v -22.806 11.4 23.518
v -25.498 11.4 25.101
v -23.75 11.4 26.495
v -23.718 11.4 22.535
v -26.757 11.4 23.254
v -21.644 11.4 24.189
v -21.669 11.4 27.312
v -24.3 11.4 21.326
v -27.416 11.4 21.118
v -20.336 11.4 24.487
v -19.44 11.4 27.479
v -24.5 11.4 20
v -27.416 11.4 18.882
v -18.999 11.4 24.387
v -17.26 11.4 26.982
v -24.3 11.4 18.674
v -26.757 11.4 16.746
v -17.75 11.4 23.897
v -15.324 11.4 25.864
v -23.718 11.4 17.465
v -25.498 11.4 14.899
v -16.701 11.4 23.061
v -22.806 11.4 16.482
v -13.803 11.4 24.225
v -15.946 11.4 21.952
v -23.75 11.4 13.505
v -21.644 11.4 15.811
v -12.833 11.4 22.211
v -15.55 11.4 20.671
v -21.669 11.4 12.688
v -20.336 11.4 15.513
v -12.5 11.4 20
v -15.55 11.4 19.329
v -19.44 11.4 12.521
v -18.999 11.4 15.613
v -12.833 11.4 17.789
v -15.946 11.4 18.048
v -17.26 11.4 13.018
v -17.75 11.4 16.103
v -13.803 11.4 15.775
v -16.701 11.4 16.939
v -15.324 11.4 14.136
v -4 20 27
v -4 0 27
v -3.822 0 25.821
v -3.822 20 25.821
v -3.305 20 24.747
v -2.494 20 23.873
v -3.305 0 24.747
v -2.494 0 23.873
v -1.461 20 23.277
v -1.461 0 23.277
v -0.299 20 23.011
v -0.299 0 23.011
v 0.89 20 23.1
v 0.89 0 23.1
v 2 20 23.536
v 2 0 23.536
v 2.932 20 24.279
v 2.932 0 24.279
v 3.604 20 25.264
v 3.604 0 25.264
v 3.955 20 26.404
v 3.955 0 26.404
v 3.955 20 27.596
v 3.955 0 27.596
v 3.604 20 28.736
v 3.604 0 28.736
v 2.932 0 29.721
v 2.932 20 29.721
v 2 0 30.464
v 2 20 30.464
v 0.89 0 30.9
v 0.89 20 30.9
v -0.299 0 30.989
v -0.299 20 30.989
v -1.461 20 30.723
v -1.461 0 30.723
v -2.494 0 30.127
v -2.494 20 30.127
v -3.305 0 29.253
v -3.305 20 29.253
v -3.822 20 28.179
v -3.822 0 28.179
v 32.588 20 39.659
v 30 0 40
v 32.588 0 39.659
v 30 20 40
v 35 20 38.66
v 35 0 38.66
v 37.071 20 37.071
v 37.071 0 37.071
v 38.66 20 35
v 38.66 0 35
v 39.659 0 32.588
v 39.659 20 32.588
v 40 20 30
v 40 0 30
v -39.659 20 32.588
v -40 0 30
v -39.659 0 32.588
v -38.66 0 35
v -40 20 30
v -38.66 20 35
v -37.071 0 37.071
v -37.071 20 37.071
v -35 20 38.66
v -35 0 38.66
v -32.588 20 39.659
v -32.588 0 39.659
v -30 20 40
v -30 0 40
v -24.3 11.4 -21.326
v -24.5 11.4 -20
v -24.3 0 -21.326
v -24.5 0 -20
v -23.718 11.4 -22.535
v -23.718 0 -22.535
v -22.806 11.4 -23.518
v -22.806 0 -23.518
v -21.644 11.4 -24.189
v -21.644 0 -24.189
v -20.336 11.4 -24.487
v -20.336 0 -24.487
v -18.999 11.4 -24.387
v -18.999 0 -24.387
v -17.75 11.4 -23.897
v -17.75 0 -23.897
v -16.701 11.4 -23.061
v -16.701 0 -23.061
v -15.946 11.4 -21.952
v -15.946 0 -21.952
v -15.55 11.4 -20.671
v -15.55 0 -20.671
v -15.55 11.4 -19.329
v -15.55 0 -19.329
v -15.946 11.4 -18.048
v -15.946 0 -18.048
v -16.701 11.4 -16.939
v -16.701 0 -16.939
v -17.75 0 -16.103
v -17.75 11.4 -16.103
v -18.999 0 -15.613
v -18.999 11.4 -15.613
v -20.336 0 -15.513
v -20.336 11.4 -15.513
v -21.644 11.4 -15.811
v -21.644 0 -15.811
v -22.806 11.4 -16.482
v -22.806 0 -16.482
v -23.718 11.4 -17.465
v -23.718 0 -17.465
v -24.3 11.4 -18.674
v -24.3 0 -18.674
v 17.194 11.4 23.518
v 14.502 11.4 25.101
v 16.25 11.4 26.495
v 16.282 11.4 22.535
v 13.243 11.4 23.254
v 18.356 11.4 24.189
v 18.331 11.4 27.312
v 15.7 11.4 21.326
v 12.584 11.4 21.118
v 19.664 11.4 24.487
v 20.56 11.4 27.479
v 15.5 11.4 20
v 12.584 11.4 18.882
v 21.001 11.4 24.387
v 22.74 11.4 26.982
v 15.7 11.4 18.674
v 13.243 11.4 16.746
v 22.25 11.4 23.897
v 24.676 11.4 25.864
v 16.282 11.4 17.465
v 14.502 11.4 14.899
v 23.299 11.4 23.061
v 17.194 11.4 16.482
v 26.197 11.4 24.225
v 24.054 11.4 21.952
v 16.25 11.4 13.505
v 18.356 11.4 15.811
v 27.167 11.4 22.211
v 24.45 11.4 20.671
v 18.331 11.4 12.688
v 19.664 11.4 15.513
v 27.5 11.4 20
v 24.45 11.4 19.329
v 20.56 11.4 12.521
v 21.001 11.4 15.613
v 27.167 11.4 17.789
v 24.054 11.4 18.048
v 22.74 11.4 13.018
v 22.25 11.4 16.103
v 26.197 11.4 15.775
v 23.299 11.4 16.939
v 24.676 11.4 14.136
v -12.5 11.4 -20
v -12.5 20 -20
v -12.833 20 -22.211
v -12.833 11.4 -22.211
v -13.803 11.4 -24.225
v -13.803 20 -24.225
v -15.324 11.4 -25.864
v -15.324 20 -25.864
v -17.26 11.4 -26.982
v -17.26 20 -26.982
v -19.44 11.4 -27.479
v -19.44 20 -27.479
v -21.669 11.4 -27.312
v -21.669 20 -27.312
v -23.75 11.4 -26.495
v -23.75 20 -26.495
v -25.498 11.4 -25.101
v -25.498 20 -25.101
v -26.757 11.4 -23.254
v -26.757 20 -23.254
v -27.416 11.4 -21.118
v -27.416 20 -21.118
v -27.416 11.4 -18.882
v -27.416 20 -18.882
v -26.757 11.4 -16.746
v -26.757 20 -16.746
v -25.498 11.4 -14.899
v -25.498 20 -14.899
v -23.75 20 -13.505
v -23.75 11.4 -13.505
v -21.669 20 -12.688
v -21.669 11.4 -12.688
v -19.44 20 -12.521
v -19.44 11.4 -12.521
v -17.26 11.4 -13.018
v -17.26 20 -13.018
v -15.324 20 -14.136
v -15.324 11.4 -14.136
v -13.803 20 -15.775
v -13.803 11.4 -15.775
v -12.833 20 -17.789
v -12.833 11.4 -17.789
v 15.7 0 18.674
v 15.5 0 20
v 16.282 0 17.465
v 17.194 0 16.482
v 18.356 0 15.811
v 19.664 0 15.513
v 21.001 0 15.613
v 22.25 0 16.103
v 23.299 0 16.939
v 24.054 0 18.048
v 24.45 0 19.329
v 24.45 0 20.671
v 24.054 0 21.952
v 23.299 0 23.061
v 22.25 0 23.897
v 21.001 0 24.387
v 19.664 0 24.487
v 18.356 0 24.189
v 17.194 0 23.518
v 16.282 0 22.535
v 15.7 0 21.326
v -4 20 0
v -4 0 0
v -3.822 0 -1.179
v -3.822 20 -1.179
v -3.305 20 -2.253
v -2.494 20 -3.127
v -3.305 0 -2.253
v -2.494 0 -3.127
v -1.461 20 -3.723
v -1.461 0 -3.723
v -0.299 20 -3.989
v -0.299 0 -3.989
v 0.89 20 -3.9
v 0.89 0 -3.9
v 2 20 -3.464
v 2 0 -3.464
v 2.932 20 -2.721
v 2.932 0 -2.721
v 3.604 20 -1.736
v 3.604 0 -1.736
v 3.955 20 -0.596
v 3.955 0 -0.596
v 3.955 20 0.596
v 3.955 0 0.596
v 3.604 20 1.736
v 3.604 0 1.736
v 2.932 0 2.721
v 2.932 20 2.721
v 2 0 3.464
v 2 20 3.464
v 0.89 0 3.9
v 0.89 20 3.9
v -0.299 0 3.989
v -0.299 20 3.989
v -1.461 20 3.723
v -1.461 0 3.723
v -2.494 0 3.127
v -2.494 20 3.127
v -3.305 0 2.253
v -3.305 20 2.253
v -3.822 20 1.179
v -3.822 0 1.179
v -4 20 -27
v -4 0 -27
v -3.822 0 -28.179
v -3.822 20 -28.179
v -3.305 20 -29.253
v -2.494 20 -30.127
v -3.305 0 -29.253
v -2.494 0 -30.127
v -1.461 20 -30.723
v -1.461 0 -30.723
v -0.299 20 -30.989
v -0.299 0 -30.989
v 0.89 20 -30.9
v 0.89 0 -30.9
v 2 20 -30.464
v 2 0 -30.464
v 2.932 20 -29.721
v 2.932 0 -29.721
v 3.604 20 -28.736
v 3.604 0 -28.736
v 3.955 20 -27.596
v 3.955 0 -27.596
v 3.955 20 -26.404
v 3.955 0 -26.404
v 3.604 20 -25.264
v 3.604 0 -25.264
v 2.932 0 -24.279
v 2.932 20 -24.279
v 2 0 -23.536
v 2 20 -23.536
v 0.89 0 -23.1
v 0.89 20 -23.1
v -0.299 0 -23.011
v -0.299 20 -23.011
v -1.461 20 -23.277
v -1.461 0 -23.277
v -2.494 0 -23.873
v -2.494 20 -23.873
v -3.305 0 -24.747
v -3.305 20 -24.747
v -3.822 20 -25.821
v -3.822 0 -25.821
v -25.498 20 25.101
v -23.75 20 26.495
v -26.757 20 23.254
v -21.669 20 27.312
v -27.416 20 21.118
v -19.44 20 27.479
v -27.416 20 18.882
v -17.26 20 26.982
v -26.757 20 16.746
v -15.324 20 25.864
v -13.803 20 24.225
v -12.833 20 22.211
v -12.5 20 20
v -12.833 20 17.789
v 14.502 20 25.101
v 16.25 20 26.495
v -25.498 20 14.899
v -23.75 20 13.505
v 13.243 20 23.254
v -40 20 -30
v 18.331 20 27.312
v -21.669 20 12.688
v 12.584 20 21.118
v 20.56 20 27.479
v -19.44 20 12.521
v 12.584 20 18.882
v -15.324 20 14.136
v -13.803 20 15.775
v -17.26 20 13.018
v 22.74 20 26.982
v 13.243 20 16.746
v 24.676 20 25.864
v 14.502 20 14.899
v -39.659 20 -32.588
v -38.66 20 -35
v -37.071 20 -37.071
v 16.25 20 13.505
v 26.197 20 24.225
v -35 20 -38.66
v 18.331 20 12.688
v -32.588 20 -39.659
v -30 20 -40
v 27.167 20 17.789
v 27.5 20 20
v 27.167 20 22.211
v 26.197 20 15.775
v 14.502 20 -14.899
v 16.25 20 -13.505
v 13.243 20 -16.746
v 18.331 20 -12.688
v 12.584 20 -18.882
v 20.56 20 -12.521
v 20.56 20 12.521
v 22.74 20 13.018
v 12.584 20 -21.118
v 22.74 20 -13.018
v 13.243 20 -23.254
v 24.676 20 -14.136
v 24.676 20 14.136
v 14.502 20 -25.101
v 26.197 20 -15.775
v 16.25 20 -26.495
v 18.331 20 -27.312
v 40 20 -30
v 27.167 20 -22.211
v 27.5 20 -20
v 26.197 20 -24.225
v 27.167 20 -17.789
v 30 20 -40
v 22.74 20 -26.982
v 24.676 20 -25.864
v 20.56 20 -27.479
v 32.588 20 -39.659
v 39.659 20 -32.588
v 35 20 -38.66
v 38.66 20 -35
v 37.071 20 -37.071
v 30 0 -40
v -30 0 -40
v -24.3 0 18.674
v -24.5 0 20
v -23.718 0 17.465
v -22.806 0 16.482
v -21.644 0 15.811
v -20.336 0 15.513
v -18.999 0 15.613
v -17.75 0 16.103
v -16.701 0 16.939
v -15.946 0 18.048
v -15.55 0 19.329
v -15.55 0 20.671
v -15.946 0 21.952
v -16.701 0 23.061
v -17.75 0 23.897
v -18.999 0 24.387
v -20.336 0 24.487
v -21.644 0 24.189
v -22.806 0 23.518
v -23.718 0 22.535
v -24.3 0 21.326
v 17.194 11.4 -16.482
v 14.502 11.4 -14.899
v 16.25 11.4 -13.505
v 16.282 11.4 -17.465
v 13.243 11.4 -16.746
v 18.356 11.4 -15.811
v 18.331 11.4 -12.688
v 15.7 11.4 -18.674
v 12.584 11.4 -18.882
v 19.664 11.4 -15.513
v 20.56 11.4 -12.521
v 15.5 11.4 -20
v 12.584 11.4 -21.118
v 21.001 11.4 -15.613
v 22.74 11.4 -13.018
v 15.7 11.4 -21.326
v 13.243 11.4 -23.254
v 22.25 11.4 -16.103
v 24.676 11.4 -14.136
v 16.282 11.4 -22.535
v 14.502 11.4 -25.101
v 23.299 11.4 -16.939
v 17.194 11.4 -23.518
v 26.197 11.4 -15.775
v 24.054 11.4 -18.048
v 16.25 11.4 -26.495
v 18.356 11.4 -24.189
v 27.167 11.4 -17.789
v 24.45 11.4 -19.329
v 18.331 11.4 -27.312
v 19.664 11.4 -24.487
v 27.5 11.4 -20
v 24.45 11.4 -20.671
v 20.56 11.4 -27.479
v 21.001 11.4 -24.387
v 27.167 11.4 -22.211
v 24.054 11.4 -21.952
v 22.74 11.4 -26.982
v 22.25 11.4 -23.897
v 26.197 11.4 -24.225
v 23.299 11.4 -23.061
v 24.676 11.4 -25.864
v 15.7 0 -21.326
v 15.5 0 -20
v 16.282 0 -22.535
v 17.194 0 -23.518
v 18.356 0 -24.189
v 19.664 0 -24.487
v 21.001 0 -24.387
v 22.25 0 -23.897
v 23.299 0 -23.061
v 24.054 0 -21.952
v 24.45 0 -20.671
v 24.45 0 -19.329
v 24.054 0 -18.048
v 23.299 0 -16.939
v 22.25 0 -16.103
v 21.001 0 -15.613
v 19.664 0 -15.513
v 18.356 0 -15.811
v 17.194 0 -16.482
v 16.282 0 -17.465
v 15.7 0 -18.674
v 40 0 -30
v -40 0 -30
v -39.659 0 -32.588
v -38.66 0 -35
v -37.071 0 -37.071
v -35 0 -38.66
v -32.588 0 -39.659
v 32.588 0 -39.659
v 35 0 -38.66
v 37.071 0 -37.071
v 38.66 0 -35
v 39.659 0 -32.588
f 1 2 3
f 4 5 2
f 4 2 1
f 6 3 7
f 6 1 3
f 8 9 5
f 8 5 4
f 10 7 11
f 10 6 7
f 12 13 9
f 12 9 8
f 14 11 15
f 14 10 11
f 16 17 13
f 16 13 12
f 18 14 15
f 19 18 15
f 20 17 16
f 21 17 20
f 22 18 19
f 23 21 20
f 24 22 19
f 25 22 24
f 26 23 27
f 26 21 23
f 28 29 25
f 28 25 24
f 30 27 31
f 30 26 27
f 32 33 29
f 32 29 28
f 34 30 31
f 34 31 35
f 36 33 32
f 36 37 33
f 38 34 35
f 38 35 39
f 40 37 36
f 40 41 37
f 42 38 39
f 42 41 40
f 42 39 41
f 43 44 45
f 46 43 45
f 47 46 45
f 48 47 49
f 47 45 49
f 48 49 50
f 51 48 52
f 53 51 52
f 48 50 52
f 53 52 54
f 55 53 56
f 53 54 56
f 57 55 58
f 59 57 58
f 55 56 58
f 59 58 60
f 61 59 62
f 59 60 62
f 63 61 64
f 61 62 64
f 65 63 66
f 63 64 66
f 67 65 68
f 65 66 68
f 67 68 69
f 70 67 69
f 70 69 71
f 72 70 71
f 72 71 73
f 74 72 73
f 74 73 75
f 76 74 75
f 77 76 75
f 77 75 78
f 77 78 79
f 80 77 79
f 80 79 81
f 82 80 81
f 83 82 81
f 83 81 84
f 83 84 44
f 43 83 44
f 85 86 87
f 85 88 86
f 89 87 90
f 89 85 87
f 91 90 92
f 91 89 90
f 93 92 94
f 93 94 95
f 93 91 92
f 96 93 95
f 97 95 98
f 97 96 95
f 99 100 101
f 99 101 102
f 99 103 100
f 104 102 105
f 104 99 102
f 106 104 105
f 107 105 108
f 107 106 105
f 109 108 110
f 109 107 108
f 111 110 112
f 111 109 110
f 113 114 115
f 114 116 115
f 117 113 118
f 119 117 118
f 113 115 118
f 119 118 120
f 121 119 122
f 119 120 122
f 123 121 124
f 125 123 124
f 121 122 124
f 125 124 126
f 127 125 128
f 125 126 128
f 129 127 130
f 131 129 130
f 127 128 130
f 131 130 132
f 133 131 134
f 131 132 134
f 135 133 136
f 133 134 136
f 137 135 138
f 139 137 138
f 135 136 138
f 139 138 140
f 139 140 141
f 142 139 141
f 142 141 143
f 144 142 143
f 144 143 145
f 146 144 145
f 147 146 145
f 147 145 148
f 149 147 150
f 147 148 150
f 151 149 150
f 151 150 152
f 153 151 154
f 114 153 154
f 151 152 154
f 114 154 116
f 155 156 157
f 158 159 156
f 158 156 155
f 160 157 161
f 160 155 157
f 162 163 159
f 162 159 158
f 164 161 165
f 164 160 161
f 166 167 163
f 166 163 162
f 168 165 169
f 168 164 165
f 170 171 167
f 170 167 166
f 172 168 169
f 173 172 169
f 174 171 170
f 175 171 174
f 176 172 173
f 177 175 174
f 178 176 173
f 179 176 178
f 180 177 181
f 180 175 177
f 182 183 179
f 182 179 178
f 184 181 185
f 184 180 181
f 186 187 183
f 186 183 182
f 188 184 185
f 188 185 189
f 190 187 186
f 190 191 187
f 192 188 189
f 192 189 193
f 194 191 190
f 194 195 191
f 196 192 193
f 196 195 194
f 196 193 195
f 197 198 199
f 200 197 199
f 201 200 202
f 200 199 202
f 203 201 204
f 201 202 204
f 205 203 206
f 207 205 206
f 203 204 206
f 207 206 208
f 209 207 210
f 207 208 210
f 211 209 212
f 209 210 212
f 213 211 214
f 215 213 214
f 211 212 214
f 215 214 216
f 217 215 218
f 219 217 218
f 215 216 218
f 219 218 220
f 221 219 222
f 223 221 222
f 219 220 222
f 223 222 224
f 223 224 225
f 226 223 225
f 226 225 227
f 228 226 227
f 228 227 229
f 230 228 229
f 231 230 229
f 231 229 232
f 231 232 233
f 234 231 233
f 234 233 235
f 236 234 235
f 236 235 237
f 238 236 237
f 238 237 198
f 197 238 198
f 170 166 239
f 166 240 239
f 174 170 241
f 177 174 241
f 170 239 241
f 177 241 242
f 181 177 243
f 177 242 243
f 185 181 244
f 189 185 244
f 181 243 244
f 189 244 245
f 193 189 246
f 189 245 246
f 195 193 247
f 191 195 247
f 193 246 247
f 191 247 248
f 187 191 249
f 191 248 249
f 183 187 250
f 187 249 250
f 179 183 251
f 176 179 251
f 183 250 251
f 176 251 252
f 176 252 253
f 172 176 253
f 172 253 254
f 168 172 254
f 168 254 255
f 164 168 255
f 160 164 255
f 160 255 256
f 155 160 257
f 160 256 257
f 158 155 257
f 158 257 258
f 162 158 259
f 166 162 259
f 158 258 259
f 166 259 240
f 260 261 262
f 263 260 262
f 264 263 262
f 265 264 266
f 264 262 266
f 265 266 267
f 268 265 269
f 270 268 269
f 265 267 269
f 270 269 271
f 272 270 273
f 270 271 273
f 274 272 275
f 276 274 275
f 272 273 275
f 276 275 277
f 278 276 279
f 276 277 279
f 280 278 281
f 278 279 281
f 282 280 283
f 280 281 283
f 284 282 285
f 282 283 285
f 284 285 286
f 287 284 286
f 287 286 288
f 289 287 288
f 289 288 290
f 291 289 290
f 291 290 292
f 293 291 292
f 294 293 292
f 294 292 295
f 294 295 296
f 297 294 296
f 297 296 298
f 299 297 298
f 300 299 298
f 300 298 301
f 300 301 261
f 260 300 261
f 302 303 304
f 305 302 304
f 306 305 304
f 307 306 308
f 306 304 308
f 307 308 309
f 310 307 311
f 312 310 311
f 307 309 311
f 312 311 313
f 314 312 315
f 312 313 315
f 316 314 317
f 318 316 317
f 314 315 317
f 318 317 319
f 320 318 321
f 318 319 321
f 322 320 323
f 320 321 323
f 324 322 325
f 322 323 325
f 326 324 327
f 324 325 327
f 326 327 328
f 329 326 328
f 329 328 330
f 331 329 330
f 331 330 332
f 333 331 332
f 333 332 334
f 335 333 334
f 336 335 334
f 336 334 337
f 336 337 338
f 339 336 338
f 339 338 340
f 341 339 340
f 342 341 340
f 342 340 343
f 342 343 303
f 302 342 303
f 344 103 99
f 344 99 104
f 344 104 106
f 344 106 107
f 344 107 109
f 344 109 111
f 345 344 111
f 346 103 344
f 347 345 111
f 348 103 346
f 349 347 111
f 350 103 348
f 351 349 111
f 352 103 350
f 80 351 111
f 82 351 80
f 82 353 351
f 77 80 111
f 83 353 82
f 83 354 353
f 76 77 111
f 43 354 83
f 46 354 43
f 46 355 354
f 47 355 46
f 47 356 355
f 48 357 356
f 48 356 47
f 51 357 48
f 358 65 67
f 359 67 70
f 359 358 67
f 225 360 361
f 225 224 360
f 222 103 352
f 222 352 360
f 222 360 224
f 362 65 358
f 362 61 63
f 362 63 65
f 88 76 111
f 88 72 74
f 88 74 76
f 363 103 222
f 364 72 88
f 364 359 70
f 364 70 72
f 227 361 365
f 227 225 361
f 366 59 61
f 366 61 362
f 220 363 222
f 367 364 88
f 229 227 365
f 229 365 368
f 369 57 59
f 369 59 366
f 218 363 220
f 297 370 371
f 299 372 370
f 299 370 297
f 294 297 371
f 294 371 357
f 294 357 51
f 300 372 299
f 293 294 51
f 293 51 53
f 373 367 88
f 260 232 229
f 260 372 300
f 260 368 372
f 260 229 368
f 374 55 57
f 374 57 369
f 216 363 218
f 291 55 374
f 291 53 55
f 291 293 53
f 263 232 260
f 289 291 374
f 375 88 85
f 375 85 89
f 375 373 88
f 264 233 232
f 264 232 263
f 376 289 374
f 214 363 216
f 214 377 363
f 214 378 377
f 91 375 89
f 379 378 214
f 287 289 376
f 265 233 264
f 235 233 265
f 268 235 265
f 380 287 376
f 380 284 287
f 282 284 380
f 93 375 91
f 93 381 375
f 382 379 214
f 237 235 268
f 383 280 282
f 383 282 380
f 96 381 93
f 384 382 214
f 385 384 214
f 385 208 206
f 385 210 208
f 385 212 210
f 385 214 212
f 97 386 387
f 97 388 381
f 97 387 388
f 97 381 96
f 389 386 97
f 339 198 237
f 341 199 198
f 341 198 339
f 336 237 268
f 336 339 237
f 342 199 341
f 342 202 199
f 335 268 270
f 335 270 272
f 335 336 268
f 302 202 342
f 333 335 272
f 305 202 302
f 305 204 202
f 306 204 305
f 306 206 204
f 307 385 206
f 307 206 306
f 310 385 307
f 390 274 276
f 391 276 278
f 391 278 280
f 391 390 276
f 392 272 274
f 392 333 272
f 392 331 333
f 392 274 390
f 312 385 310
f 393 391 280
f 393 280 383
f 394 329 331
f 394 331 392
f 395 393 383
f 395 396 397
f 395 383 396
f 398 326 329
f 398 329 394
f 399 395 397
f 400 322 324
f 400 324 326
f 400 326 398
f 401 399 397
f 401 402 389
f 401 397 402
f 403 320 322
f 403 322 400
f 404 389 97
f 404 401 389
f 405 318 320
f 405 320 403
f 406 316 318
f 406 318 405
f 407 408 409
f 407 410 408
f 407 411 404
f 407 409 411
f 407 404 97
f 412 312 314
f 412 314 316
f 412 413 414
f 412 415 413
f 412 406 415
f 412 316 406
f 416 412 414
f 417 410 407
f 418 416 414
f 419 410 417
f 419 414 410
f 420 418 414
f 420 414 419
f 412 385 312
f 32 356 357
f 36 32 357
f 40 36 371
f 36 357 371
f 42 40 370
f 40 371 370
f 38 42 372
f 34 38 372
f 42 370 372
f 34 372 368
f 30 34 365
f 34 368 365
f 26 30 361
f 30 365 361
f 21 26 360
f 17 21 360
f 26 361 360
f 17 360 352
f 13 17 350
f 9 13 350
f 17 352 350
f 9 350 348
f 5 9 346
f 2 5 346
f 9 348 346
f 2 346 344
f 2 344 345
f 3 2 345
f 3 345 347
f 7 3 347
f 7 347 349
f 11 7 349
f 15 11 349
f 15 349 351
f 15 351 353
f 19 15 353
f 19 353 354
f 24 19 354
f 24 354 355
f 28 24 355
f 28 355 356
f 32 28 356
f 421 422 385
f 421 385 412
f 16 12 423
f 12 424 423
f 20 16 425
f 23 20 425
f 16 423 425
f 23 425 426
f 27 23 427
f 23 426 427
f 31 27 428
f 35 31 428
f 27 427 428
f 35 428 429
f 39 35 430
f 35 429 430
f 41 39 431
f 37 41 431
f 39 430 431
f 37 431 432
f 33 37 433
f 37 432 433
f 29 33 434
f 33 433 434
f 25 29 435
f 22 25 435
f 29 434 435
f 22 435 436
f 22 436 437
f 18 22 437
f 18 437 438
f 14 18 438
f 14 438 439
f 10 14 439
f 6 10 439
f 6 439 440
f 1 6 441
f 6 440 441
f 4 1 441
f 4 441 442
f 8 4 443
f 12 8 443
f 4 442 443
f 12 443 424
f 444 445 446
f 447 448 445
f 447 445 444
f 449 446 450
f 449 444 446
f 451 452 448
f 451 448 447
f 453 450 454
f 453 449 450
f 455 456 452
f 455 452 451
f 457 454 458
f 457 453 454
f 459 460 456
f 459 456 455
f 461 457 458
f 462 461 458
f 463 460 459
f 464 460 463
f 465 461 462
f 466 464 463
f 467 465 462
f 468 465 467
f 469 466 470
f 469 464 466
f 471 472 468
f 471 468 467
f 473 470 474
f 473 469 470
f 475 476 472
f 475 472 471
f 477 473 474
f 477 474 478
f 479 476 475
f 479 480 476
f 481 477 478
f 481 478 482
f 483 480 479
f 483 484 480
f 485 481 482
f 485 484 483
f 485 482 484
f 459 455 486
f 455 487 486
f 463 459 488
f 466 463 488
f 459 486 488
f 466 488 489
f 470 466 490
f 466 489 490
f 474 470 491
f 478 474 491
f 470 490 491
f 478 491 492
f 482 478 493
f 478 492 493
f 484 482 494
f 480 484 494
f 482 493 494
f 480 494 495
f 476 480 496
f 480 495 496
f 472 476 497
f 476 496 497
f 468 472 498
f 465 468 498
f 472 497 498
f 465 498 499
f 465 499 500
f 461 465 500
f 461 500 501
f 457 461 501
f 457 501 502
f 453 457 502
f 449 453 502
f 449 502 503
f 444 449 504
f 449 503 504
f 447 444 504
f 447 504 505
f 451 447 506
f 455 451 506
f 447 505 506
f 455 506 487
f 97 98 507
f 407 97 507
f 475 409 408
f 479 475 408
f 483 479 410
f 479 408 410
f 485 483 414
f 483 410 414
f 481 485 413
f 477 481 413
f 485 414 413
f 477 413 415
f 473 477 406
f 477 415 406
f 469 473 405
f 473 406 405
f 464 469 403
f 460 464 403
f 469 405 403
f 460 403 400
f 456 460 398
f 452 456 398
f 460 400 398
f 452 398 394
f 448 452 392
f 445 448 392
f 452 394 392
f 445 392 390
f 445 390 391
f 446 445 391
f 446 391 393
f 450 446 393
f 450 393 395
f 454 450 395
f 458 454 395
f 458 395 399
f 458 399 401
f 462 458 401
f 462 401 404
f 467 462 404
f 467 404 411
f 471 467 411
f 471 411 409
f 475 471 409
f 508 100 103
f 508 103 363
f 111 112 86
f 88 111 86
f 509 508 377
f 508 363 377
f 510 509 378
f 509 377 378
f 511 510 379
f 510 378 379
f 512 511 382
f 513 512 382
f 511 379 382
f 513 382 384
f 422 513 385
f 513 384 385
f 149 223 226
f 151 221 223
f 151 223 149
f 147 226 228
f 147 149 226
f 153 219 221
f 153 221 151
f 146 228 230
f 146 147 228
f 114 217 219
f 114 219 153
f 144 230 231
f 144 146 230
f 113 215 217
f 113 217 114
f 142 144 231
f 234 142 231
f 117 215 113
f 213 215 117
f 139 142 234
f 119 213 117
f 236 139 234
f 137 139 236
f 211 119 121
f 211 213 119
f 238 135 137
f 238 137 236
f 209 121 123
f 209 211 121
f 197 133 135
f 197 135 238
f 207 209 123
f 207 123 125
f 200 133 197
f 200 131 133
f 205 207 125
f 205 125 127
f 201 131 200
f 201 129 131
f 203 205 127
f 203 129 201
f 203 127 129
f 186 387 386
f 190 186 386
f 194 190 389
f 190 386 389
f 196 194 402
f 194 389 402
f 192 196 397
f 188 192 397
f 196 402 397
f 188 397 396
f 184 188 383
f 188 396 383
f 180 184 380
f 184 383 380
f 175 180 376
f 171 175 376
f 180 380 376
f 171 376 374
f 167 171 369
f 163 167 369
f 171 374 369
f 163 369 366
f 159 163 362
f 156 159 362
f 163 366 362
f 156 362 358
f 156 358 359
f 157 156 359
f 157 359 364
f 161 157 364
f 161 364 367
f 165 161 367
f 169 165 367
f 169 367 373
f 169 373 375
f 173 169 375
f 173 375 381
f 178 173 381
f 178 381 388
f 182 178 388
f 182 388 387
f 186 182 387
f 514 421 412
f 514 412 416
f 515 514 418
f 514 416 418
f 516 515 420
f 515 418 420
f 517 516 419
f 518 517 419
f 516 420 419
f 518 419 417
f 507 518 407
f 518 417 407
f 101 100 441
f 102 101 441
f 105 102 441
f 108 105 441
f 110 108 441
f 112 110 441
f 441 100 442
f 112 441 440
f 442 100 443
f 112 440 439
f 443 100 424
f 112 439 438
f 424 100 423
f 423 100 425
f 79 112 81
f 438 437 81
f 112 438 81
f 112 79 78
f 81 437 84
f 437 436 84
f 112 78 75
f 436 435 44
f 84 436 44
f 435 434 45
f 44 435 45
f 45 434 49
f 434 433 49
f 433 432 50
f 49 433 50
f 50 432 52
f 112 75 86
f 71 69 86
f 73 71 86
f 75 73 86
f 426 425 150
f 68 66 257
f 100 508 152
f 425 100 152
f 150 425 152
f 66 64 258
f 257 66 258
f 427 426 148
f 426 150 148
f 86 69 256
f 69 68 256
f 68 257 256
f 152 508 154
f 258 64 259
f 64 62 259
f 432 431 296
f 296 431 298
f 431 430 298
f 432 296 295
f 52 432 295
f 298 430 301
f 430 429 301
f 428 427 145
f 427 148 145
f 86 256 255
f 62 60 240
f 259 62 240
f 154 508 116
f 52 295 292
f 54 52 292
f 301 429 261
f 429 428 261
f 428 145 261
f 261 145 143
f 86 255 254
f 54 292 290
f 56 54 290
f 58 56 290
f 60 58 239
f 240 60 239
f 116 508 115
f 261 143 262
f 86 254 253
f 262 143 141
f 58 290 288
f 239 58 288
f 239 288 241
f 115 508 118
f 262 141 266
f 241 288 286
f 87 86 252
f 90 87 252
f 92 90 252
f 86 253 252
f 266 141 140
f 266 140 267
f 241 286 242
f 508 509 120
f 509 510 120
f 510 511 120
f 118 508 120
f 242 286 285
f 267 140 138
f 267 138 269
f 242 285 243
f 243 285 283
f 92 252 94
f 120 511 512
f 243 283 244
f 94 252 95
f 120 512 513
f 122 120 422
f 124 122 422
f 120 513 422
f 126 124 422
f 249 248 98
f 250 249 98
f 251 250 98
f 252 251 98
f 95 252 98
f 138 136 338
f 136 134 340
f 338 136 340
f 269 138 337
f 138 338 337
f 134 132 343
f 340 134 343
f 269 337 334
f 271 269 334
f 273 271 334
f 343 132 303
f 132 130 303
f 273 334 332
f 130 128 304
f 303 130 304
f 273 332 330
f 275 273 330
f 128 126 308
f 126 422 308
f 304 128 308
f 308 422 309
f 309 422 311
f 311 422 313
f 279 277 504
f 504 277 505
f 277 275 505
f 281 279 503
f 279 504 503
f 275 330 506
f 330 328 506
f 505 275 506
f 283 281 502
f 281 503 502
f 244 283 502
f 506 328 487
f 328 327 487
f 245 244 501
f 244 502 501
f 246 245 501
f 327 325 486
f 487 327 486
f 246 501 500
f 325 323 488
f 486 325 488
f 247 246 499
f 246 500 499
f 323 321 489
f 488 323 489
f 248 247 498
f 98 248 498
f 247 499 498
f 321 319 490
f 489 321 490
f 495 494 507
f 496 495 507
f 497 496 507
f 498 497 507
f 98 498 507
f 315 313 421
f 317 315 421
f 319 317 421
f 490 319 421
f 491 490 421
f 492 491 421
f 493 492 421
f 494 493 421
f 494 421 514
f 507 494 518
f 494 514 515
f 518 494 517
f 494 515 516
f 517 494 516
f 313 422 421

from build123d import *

# Parameters (mm, degrees)
SZKIC1_W                                            = 80
SZKIC1_H                                            = 80
DODANIE_WYCI_GNI_CIE1_DEPTH                         = 20
POG_BIENIE_WALCOWE_POD_M8_WKR_T_Z_BEM_W_D           = 9
POG_BIENIE_WALCOWE_POD_M8_WKR_T_Z_BEM_W_CBORE_D     = 15
POG_BIENIE_WALCOWE_POD_M8_WKR_T_Z_BEM_W_CBORE_DEPTH = 8.6
OTWORY_USTALAJ_CE_8_0MM1_D                          = 8
ZAOKR_GLENIE1_R                                     = 10


with BuildPart() as part:
    # Szkic1 → Dodanie-wyciągnięcie1 (new body)
    with BuildSketch(Plane(origin=(0, 0, 0), x_dir=(1, 0, 0), z_dir=(0, 1, 0))):
        Rectangle(SZKIC1_W, SZKIC1_H)
    extrude(amount=DODANIE_WYCI_GNI_CIE1_DEPTH)

    # Pogłębienie walcowe pod M8 Wkręt z łbem walcowym z gniazdem sześciokątnym1 (through all)
    with Locations(Plane(origin=(0, 20, 0), x_dir=(1, 0, 0), z_dir=(0, 1, 0))):
        with Locations((-20, 20), (20, 20), (20, -20), (-20, -20)):
            CounterBoreHole(POG_BIENIE_WALCOWE_POD_M8_WKR_T_Z_BEM_W_D / 2, POG_BIENIE_WALCOWE_POD_M8_WKR_T_Z_BEM_W_CBORE_D / 2, POG_BIENIE_WALCOWE_POD_M8_WKR_T_Z_BEM_W_CBORE_DEPTH)

    # Otwory ustalające Ø8.0mm1 (through all)
    with Locations(Plane(origin=(0, 20, 0), x_dir=(1, 0, 0), z_dir=(0, 1, 0))):
        with Locations((0, 27), (0, 0), (0, -27)):
            Hole(OTWORY_USTALAJ_CE_8_0MM1_D / 2)

    # Zaokrąglenie1
    zaokr_glenie1_edges = [part.edges().sort_by_distance(p)[0] for p in [
        (40, 10, 40),
        (-40, 10, 40),
        (-40, 10, -40),
        (40, 10, -40),
    ]]
    fillet(zaokr_glenie1_edges, radius=ZAOKR_GLENIE1_R)


solid = part.part
